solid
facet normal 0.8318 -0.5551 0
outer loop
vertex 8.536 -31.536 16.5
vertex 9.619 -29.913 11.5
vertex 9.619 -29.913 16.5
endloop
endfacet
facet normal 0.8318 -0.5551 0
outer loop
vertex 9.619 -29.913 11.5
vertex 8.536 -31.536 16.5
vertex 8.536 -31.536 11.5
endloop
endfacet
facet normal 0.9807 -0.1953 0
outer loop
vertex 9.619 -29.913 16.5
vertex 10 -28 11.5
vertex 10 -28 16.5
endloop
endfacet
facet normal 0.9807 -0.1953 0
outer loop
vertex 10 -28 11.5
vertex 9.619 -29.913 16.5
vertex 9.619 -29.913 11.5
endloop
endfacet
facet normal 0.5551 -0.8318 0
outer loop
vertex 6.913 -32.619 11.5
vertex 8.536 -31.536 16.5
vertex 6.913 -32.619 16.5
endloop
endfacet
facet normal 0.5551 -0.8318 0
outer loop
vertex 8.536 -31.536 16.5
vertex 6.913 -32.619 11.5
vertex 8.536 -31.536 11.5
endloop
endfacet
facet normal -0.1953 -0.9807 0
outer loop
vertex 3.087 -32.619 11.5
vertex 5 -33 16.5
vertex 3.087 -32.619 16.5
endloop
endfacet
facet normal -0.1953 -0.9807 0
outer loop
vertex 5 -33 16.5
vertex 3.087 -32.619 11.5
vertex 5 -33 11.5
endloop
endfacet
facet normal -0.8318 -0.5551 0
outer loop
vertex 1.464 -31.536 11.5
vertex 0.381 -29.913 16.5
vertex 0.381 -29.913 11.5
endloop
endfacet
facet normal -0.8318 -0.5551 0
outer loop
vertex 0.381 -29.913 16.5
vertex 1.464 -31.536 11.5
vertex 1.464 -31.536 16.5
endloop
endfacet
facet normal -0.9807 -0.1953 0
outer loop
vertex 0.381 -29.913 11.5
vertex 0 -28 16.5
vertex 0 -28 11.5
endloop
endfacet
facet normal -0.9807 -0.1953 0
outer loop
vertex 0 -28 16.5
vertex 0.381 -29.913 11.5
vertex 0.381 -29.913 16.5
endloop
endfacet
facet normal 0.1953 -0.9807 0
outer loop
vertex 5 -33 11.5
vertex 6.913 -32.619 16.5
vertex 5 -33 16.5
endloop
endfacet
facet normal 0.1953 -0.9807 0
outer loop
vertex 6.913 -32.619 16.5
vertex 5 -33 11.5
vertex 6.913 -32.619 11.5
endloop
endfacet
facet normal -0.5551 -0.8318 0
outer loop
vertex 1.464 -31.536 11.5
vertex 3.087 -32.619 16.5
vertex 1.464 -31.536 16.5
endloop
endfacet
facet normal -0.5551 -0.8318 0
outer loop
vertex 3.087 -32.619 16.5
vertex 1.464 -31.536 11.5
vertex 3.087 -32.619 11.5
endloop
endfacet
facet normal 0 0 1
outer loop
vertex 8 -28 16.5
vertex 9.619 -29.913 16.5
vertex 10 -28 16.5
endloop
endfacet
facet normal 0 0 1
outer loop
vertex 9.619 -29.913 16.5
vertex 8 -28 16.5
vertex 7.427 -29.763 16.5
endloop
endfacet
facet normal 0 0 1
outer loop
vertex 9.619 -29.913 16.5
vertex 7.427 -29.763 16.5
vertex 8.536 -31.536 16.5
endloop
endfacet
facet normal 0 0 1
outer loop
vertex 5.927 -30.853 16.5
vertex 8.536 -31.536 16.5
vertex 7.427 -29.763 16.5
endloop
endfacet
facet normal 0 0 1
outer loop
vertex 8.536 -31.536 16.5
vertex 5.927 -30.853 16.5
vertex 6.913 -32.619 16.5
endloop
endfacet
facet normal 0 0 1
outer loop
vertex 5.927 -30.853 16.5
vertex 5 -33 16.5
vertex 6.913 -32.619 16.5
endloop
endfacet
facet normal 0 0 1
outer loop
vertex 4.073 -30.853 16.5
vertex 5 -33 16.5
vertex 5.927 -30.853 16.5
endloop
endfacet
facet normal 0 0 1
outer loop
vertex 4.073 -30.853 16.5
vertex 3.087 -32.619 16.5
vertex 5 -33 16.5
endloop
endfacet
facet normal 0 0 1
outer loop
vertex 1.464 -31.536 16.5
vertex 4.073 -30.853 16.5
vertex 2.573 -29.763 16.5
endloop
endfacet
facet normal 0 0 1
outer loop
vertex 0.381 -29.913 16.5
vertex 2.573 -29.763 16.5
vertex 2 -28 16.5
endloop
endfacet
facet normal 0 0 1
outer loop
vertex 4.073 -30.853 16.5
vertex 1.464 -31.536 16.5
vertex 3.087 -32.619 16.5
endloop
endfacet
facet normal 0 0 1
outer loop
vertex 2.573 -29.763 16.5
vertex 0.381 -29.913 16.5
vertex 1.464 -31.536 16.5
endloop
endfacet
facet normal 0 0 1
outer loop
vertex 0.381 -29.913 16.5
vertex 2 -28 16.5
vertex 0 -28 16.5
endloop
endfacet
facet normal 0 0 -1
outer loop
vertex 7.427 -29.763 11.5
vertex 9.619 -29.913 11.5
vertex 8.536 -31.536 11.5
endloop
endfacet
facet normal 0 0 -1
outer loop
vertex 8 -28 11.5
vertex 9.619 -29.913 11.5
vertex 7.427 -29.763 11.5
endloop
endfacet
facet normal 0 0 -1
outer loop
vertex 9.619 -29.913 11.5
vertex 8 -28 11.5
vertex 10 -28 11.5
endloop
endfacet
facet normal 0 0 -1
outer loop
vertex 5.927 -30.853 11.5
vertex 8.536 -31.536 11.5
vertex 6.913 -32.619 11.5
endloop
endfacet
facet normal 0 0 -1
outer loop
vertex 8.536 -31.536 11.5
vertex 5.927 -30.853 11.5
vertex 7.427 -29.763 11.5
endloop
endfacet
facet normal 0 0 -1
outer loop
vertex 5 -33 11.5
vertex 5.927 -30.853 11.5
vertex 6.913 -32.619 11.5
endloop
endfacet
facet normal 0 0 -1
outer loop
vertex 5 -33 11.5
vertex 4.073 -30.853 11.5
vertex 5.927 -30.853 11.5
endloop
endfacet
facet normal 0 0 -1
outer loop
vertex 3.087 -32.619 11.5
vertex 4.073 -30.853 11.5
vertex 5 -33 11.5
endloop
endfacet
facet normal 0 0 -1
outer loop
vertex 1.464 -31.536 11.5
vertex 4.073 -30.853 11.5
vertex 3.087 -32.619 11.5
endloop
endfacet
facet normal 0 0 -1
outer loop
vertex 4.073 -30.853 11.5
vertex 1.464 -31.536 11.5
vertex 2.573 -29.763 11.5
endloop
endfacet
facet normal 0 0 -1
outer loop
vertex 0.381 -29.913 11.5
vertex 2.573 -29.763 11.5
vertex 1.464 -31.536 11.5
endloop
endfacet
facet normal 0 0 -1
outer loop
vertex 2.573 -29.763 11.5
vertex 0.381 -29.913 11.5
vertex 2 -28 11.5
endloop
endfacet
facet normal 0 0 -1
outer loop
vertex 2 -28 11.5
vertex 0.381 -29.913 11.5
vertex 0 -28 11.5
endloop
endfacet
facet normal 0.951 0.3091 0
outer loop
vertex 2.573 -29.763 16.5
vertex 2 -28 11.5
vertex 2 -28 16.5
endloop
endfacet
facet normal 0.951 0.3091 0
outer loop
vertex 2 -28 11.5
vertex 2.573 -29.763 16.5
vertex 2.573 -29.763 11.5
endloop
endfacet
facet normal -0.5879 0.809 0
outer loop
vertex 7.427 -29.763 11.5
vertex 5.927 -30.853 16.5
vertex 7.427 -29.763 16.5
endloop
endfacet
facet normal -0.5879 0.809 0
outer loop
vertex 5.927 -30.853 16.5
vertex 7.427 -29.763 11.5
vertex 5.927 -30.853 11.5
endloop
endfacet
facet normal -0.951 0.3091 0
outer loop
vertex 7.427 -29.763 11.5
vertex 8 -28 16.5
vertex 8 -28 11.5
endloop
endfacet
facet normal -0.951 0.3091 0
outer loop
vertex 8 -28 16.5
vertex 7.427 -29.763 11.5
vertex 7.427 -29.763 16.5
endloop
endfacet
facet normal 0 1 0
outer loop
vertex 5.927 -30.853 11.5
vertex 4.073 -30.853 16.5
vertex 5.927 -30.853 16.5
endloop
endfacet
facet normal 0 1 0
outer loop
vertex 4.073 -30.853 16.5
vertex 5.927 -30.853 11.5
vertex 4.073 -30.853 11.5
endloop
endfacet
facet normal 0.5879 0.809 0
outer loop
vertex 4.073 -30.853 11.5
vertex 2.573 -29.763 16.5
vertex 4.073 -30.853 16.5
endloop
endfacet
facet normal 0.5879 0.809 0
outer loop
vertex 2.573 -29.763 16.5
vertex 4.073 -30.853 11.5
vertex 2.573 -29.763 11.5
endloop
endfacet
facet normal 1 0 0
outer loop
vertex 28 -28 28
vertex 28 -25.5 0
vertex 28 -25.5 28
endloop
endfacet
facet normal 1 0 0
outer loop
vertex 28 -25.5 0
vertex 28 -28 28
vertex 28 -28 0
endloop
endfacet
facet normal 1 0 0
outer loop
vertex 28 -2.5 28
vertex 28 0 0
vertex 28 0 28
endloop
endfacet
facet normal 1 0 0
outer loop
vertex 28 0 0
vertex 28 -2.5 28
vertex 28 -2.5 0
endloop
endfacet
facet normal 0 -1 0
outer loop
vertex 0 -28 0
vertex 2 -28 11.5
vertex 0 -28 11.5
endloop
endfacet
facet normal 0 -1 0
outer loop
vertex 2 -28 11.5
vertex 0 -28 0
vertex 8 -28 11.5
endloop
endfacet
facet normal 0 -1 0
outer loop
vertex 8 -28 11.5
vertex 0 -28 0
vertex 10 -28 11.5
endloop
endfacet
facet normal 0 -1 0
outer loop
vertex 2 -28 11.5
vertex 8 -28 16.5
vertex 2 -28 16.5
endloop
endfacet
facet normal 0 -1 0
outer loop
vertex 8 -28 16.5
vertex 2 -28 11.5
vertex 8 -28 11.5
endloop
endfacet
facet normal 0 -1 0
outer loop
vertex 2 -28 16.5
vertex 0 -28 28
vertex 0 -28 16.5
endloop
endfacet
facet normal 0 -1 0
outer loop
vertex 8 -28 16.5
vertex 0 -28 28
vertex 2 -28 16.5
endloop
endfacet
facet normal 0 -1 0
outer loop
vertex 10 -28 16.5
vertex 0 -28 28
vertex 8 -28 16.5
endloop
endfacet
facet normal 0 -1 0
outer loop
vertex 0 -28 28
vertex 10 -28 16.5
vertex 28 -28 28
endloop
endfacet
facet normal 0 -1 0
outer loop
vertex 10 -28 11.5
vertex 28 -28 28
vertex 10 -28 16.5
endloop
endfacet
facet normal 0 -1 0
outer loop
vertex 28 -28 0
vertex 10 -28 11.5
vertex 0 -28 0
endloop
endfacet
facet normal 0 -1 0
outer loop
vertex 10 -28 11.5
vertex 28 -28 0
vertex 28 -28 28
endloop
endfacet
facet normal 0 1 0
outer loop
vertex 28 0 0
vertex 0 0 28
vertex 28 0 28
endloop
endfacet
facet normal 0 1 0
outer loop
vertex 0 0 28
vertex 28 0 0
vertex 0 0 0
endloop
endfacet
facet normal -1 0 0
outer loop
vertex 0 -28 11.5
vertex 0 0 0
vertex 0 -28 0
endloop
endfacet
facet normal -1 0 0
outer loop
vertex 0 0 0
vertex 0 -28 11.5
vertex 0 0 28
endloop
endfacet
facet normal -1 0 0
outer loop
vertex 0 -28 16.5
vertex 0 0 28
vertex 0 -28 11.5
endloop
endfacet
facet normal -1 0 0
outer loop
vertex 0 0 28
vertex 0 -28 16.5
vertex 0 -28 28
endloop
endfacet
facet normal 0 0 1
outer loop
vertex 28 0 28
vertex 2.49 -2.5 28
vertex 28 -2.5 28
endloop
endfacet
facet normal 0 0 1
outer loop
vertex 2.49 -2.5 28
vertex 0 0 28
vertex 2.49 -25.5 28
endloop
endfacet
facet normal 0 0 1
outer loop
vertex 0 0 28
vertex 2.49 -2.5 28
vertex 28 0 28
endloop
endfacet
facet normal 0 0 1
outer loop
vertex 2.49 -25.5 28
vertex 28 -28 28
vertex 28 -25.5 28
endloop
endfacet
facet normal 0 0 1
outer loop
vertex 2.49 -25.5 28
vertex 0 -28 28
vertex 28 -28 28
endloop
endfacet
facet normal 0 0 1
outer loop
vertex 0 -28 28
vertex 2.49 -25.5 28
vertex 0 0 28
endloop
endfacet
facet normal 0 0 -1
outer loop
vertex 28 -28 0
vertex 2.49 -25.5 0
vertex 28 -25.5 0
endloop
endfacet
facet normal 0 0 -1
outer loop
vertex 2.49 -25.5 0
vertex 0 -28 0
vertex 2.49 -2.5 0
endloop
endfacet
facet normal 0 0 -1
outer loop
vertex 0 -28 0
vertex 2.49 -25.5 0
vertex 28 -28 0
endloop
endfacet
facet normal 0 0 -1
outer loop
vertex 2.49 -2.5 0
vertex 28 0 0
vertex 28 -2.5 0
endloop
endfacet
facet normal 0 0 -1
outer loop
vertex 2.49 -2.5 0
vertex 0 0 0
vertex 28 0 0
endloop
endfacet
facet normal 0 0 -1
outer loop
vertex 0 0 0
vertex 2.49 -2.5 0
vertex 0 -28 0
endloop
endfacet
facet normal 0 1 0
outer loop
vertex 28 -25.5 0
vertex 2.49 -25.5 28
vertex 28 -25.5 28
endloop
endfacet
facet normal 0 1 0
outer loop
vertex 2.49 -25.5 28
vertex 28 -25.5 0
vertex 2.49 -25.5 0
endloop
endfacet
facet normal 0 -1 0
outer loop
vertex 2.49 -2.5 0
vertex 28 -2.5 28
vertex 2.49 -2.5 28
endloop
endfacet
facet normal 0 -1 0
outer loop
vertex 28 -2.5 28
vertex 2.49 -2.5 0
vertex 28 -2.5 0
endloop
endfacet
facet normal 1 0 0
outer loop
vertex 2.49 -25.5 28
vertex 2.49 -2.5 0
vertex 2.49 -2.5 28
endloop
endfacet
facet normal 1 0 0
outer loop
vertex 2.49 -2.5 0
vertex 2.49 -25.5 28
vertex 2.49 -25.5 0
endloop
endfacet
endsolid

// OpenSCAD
/* [Global] */
table_height = 23;
clipper_thickness = 5; 
hole_radius = 3;

/* [Hidden] */
printable = 1;
mo = 0.01;

rotate([printable?90:0,0,0])
clipper();

module clipper() {
	difference() {
		union(){
			cube(table_height + clipper_thickness);

			difference(){
				translate([hole_radius+2, (table_height + clipper_thickness*2  )/2, table_height + clipper_thickness])
				rotate([90,0,0])
					cylinder(h=clipper_thickness,r=hole_radius+2);

				translate([hole_radius+2, (table_height + clipper_thickness*2  )/2 +mo , table_height + clipper_thickness])
				rotate([90,0,0])
					cylinder(h=clipper_thickness+2*mo,r=hole_radius);
			}
		}


		translate([-mo+clipper_thickness/2,-mo,clipper_thickness/2])
			cube([table_height+clipper_thickness + 2*mo,table_height+clipper_thickness + 2*mo,table_height]);
	}
}

